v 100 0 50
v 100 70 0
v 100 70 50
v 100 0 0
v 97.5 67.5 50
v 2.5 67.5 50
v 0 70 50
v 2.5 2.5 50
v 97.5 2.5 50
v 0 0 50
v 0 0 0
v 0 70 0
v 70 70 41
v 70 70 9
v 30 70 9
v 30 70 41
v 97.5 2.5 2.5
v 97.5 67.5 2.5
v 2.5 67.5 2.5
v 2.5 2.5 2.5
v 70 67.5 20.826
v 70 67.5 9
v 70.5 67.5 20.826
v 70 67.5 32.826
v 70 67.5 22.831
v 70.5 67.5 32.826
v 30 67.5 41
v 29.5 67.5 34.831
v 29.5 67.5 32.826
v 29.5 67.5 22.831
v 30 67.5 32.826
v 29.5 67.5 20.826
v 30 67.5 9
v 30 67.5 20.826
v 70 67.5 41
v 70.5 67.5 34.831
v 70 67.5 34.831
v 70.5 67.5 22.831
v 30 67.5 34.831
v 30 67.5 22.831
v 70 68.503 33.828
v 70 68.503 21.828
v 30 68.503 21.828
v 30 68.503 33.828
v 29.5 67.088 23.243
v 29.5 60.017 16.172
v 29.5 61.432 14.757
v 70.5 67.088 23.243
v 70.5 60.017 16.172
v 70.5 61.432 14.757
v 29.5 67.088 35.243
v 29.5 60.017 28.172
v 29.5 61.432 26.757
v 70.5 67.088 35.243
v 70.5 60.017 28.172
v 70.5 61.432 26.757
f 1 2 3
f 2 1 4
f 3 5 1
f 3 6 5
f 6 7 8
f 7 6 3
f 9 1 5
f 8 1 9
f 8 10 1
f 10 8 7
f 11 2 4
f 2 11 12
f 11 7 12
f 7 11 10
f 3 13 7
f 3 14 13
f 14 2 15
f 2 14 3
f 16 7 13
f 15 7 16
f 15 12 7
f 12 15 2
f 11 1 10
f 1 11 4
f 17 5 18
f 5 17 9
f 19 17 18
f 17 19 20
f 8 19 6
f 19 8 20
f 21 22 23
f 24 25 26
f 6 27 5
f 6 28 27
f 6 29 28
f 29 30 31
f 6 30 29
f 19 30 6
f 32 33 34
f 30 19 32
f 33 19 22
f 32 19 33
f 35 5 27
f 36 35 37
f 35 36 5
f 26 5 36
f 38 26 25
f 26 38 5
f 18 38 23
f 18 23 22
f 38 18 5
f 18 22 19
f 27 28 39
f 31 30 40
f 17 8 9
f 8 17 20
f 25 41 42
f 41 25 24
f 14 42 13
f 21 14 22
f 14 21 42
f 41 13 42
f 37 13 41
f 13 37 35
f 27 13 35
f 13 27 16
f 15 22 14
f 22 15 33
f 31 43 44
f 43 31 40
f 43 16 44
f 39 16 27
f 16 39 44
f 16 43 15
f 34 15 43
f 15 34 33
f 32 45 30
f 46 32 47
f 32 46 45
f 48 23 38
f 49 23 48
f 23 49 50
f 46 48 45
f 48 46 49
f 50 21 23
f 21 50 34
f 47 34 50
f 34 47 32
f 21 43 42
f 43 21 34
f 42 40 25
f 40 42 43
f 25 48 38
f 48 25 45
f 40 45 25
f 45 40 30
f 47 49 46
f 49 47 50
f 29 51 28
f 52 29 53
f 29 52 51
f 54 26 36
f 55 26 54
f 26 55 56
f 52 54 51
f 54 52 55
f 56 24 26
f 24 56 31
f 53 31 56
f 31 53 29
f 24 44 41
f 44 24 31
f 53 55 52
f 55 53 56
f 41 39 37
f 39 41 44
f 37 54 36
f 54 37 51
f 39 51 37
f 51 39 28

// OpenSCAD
$fn = 32;

// ----------------------------------------------------------------------
// Vent box: louvers enclosure
// ----------------------------------------------------------------------

// --- parameters (mm) ---
box_l = 100;              // box length, X
box_w = 70;               // box width, Y
box_h = 50;               // box height, Z
wall_t = 2.5;             // shell wall thickness
win_l = 40;               // vent window width, X
win_h = 32;               // vent window height, Z
slat_t = 2;               // louver slat thickness
slat_d = 10;              // louver slat depth
slat_a = 45;              // louver slat angle, degrees
slat_pitch = 12;          // louver pitch
slat_yc = 64.26;          // slat centreline Y

win_z0 = (box_h - win_h) / 2;  // window lower edge Z
n_slats = 2;  // louver count
slat_z0 = win_z0 + (win_h - (n_slats - 1) * slat_pitch) / 2;

difference() {
  union() {
    difference() {
      cube([box_l, box_w, box_h]);
  translate([wall_t, wall_t, wall_t])
    cube([box_l - 2 * wall_t, box_w - 2 * wall_t, box_h]);
  translate([(box_l - win_l) / 2, box_w - wall_t - 1, win_z0])
    cube([win_l, wall_t + 2, win_h]);
    }
    for (i = [0 : n_slats - 1])
      translate([box_l / 2, slat_yc, slat_z0 + i * slat_pitch])
        rotate([slat_a, 0, 0])
          cube([win_l + 1, slat_d, slat_t], center = true);
  }
}
